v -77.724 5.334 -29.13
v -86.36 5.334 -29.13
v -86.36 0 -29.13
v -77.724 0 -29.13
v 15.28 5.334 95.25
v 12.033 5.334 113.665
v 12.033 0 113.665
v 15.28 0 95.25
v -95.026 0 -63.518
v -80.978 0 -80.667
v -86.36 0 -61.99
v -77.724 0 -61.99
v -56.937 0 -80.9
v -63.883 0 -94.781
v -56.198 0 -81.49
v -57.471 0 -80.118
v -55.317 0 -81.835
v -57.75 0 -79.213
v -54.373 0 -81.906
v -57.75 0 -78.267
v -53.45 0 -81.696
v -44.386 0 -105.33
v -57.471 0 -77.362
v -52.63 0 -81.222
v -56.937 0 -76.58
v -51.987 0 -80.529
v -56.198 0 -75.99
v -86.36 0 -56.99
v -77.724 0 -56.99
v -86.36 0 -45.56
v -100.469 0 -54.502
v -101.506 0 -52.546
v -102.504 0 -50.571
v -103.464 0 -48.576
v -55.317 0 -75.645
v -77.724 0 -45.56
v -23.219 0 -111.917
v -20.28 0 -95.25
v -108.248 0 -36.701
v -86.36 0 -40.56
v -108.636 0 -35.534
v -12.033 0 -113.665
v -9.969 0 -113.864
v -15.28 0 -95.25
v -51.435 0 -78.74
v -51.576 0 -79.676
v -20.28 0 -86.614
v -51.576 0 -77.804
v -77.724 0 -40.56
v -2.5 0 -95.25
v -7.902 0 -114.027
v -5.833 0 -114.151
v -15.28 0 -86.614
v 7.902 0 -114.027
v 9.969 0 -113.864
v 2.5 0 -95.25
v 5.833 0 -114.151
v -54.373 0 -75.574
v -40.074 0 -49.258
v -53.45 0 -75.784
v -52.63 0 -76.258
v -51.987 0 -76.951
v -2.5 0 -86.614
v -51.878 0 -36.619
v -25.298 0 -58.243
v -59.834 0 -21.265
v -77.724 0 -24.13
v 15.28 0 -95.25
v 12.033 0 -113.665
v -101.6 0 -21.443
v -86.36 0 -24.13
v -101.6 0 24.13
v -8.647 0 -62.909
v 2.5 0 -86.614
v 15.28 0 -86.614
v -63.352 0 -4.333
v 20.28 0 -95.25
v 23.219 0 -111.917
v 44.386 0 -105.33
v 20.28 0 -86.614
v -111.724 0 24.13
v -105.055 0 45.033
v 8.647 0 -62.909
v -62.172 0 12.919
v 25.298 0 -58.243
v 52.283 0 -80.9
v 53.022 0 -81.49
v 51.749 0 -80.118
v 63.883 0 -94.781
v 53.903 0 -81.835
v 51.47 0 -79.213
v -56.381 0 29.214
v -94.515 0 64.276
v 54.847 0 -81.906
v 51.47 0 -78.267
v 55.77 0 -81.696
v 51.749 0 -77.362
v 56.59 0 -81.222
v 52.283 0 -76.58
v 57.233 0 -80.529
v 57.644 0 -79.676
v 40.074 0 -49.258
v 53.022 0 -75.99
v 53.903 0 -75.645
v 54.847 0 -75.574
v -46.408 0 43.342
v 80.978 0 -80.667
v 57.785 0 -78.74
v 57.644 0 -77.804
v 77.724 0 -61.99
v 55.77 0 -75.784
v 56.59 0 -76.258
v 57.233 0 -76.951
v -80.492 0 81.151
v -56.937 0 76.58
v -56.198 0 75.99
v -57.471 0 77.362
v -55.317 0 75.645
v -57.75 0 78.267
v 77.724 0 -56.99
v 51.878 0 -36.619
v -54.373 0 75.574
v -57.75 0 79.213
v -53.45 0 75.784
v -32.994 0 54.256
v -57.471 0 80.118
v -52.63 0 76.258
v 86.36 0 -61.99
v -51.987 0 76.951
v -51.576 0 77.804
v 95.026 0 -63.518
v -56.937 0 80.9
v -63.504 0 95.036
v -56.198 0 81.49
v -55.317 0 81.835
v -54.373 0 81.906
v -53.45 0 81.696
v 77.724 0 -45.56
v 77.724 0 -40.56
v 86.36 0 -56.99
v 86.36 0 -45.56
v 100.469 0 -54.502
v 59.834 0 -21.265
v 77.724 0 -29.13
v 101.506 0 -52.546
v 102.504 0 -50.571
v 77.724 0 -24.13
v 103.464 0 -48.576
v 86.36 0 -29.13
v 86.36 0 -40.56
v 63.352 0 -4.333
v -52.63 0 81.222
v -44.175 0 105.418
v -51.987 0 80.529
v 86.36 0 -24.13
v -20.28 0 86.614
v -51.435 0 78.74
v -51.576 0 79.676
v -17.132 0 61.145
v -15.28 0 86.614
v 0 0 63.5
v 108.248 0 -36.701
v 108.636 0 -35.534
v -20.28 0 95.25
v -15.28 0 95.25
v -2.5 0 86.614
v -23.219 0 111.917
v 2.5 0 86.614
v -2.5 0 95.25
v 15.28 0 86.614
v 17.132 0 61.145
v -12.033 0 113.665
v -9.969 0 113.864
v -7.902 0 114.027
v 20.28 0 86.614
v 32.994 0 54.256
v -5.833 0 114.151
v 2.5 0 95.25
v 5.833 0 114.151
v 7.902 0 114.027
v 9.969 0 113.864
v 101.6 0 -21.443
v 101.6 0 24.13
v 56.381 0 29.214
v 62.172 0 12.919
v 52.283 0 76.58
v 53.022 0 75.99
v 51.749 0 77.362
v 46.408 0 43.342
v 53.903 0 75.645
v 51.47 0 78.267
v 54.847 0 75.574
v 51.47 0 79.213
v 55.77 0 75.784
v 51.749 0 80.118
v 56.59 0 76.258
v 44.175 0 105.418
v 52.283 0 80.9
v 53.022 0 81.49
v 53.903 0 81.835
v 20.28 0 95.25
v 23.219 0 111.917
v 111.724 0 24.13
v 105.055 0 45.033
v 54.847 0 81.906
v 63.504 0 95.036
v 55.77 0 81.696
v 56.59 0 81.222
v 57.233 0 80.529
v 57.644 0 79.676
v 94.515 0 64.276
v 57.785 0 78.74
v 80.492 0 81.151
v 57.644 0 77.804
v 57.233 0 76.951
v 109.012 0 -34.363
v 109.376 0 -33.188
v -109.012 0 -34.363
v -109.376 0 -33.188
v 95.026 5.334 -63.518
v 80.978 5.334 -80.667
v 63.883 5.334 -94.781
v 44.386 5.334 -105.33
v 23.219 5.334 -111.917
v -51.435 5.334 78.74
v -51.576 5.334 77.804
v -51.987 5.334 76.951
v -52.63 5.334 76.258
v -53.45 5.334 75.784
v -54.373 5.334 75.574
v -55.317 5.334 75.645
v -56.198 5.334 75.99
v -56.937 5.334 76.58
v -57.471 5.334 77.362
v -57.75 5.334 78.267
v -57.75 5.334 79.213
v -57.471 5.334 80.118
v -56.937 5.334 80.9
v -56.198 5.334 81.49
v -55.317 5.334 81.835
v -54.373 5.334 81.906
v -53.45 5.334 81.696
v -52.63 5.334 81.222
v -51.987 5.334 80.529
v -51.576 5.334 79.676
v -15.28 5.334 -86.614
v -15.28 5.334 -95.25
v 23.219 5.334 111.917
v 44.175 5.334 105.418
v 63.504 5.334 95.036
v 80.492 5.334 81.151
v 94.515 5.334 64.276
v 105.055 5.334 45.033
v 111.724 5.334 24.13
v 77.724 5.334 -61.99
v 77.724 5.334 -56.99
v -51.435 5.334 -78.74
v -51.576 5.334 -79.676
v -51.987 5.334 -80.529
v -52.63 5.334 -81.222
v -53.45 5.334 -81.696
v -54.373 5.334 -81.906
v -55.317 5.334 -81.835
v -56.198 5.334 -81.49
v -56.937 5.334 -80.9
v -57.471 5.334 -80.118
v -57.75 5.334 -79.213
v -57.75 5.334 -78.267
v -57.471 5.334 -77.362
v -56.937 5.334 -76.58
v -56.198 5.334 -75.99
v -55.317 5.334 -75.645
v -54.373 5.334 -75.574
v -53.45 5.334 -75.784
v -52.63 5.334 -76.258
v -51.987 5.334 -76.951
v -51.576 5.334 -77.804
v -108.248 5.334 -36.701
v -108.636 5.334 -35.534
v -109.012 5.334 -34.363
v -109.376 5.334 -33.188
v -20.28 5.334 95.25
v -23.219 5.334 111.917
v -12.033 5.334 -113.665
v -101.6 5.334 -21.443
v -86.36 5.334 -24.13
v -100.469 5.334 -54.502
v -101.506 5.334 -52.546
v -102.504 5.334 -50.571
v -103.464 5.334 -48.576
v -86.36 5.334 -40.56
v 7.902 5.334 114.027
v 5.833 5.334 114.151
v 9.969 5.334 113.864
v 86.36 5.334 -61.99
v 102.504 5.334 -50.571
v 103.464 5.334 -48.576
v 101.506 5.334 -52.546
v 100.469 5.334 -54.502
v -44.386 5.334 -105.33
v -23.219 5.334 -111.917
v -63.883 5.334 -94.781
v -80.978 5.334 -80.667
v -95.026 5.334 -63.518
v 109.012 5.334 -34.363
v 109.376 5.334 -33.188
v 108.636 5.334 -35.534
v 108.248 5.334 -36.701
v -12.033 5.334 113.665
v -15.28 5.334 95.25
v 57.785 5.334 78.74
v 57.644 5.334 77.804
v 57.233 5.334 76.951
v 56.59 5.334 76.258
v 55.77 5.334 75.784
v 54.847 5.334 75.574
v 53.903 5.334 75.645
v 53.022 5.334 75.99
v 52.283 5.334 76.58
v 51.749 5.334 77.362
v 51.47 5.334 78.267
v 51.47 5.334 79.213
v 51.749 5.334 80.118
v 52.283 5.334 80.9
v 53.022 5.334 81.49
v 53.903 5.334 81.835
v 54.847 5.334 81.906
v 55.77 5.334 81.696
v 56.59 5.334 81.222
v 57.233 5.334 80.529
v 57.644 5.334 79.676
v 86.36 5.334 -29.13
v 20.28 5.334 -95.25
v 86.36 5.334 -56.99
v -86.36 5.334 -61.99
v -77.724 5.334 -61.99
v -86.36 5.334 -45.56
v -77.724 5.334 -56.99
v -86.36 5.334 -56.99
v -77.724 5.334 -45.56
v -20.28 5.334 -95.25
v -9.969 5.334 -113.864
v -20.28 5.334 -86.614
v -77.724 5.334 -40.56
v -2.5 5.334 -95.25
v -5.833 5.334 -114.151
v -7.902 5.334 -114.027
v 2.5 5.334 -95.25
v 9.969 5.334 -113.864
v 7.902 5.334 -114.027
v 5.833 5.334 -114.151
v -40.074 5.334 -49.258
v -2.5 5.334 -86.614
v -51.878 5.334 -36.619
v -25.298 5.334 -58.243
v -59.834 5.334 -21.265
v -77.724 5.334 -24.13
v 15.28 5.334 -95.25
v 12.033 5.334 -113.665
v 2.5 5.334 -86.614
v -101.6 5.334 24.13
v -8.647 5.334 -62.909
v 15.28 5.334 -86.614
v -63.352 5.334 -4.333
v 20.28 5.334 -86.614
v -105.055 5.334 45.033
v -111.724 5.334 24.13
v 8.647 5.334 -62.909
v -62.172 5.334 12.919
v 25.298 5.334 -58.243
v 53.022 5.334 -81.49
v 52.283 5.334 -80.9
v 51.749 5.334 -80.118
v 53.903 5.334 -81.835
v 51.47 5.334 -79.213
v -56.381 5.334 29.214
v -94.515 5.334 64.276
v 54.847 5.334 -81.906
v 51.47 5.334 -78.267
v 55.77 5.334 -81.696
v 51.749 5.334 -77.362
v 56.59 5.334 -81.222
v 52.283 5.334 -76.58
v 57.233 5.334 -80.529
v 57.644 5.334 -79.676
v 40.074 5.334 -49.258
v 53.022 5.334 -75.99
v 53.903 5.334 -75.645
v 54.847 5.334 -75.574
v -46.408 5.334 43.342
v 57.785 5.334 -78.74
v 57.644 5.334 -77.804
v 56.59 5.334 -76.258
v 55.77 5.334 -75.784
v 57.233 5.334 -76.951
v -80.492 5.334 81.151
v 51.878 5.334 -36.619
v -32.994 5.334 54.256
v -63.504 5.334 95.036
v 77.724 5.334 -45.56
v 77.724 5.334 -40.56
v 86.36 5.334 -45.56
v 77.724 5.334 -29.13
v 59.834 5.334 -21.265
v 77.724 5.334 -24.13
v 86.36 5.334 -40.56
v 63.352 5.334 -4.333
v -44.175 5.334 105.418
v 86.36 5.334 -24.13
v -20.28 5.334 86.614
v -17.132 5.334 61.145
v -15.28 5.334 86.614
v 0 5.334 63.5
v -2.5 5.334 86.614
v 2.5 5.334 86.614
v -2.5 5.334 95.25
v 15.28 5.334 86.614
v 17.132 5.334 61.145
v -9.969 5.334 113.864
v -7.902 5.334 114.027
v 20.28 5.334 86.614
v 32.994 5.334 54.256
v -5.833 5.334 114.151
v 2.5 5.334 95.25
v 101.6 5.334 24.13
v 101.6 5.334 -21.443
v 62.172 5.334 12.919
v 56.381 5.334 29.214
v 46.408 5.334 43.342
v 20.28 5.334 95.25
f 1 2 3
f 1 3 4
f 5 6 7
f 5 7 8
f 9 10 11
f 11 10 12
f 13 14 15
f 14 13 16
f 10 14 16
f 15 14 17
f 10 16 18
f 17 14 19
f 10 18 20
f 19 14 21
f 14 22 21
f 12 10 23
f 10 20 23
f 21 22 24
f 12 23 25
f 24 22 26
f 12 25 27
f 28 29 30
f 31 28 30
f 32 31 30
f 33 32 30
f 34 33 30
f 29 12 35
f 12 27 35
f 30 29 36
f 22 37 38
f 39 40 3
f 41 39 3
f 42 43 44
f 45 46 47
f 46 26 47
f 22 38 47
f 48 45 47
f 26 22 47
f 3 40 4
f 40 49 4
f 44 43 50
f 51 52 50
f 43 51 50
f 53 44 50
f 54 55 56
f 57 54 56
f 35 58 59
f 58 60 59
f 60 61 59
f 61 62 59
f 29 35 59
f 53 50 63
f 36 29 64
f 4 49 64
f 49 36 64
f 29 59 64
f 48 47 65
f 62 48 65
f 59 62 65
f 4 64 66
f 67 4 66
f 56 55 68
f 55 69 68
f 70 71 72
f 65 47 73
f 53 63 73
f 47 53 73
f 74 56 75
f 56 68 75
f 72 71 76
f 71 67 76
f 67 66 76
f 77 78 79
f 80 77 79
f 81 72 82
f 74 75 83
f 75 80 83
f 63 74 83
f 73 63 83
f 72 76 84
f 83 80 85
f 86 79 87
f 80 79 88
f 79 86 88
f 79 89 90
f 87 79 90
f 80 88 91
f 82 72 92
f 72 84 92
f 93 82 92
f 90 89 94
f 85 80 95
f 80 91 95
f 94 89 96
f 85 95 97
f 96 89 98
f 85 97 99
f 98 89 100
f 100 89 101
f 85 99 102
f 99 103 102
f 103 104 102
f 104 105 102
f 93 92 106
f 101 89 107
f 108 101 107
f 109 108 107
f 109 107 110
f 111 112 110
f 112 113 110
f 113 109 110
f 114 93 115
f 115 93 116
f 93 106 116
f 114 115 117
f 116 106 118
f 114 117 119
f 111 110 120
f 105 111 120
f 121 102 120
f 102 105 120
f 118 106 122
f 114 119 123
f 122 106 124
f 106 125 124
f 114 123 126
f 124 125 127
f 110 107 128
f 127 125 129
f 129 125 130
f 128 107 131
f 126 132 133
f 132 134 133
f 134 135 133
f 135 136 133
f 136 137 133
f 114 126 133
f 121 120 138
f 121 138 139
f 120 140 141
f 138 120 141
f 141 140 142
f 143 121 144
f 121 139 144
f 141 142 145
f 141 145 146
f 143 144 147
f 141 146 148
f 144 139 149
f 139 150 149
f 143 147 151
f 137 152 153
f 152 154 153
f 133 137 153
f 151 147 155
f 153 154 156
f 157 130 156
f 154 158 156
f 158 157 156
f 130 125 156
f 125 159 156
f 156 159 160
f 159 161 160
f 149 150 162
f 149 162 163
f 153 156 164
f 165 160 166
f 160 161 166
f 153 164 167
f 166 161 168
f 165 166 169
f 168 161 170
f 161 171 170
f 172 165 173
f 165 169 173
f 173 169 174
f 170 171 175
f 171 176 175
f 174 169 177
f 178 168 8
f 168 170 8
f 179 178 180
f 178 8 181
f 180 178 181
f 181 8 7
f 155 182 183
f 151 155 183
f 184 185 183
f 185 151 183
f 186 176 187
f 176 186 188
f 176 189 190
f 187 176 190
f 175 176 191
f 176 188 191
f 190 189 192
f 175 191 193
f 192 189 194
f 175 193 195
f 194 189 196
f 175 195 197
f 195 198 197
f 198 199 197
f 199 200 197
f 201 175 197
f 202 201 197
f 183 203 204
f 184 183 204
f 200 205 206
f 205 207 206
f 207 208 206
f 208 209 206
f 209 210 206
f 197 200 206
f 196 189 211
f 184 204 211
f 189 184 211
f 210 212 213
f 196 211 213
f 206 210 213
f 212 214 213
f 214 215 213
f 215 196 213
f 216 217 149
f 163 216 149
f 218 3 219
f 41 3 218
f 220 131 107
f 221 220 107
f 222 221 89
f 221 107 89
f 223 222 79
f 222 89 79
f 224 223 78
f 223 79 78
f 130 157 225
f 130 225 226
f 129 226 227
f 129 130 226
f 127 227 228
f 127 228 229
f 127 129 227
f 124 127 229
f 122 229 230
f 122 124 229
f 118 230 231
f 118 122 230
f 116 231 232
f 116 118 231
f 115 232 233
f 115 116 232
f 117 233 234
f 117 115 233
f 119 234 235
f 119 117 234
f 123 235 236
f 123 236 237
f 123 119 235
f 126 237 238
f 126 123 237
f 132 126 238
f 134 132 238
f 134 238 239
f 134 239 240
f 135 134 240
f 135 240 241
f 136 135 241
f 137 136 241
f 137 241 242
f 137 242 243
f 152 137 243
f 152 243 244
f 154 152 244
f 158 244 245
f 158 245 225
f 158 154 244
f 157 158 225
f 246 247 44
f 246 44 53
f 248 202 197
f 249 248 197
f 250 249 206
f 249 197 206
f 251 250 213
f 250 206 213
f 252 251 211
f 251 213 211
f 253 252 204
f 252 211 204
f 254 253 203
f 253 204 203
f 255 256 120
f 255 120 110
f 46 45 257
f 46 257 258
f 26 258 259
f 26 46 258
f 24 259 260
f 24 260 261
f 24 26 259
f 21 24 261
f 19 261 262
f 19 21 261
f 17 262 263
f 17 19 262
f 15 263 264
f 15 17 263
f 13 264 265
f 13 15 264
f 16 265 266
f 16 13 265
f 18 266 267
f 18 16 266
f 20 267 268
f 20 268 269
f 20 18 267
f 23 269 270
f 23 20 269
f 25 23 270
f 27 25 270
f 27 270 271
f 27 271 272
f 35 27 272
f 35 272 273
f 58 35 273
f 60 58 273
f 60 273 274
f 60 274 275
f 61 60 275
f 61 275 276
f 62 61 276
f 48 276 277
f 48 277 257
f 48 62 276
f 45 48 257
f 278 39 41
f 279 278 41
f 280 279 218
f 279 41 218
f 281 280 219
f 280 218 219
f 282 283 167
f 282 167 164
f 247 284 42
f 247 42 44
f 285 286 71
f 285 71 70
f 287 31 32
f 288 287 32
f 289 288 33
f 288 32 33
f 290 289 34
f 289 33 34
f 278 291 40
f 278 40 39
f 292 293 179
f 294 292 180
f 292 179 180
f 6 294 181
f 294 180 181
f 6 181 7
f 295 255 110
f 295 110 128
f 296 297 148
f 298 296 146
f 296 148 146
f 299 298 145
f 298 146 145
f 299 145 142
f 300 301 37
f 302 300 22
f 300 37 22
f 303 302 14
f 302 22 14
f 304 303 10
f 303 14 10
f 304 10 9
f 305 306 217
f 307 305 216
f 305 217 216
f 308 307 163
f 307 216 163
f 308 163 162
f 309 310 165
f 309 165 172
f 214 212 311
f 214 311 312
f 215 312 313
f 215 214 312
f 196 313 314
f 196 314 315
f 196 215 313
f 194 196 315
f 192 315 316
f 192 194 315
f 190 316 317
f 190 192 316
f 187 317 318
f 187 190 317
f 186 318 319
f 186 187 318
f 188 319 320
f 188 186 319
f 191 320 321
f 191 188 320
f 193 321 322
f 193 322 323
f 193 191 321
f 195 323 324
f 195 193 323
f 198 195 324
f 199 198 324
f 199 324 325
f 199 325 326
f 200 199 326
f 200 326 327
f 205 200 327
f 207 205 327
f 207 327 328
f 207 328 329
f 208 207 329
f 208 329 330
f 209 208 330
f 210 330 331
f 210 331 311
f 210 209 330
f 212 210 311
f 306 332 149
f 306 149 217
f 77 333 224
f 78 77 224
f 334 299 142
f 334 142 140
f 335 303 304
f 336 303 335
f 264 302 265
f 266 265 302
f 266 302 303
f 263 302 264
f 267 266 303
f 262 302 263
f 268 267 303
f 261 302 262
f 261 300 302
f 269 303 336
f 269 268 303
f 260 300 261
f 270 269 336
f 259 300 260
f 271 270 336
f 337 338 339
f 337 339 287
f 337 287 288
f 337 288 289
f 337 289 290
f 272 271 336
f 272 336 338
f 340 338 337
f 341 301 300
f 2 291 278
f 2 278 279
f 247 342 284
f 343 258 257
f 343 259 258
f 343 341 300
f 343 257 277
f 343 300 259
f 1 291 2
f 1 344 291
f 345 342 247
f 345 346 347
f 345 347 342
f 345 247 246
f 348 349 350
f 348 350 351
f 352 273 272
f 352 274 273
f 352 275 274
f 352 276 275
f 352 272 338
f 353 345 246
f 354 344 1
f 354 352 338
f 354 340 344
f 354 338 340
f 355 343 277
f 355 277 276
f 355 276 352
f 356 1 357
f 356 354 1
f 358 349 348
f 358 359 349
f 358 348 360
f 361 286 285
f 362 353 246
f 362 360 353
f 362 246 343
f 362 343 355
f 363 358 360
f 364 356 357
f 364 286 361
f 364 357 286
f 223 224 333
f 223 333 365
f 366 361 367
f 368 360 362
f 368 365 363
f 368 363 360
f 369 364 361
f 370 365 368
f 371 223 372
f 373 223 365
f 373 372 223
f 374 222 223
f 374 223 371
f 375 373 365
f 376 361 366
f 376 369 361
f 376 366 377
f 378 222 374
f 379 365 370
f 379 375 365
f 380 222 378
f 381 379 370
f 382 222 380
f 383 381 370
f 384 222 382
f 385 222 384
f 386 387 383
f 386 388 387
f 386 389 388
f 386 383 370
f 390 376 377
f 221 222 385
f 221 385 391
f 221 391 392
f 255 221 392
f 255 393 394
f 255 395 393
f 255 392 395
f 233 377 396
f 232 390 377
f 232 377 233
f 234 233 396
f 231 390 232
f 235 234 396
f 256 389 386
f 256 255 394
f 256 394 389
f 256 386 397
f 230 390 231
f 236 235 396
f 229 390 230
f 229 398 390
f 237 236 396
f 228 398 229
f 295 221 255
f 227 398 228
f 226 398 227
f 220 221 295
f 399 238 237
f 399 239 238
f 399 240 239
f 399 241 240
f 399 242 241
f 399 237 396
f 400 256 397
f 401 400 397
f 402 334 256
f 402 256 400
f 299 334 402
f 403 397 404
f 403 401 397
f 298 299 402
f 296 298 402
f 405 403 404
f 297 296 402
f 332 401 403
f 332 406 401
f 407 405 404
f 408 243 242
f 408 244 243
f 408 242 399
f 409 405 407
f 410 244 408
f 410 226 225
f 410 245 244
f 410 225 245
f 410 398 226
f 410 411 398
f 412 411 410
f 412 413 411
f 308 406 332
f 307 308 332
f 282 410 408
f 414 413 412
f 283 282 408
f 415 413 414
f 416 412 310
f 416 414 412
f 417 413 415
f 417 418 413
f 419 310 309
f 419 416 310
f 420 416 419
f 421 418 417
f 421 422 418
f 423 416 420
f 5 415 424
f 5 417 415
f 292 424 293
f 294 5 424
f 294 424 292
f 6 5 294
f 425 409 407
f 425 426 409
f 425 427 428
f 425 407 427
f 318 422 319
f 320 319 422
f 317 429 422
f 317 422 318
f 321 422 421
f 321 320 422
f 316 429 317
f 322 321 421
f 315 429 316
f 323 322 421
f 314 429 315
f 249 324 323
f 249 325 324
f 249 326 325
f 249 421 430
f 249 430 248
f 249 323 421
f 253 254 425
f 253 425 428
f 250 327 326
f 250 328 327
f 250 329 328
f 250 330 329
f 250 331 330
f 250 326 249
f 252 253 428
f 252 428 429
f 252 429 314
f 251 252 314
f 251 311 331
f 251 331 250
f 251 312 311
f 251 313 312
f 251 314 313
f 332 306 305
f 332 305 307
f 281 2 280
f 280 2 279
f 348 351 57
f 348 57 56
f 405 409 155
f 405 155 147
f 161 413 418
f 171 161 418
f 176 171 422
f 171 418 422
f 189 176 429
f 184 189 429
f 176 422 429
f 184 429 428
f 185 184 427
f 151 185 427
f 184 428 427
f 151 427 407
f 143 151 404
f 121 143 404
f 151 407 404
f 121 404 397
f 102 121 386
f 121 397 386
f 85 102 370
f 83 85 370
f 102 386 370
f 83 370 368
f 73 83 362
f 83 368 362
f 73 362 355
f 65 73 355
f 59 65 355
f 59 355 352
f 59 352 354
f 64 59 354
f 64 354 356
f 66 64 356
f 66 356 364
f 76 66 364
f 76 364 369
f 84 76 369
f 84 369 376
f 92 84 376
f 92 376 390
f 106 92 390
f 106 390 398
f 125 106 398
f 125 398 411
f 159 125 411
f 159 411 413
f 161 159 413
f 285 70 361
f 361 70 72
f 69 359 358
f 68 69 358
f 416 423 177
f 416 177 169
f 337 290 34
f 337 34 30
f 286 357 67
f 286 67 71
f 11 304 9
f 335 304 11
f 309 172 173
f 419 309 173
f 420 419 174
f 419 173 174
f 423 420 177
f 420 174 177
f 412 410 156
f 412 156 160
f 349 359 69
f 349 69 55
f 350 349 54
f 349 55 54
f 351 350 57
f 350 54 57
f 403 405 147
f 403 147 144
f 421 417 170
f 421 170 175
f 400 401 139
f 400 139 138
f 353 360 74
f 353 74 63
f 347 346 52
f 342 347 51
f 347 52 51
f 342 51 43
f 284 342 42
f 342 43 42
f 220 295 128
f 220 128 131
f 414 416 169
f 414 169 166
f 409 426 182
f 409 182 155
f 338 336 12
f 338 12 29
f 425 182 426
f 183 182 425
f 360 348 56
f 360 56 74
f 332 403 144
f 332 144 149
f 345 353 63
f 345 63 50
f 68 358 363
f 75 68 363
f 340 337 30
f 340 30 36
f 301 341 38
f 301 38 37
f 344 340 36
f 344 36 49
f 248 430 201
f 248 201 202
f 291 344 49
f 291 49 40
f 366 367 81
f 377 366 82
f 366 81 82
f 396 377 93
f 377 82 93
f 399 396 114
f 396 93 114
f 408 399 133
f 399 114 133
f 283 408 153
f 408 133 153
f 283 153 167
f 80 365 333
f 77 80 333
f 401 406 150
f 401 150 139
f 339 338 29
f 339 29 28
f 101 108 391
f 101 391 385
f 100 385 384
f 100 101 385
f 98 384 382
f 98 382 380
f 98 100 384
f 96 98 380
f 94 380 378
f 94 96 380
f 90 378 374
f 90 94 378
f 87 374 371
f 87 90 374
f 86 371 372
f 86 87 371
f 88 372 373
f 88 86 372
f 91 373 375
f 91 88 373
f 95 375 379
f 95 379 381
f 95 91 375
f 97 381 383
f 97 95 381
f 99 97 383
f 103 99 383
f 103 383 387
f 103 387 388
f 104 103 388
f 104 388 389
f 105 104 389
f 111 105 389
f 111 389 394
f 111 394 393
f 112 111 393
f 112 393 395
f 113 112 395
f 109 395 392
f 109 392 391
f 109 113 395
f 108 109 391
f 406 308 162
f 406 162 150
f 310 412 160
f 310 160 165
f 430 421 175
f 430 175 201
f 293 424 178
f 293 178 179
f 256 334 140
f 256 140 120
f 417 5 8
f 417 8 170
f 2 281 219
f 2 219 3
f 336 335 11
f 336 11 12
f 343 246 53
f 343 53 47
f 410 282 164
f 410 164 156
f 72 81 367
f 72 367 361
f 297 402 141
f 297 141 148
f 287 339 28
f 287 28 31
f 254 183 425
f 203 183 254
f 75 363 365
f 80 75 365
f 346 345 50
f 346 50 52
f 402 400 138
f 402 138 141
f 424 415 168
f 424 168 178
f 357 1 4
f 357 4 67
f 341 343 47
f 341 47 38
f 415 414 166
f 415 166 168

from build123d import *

# Parameters (mm, degrees)
SKETCH1_R            = 114.3
BASE_DEPTH           = 5.334
SKETCH2_R            = 63.5
CENTER_CUT_DEPTH     = 162.732592745
SENSOR_CUTOUTS_DEPTH = 162.732592745
SKETCH7_W            = 30.48
SKETCH7_H            = 48.26
CUT_EXTRUDE2_DEPTH   = 162.891213524
HOLE3_OUTLINE_R      = 3.175
HOLE3_DEPTH          = 5.334


# Read off the part's stored shape, not the designer's step: Hole3
with BuildPart() as part:
    # Sketch1 → Base (new body)
    with BuildSketch(Plane(origin=(0, 0, 0), x_dir=(1, 0, 0), z_dir=(0, 1, 0))):
        with Locations(Location((0, 0, 0), (0, 0, 270))):
            Circle(SKETCH1_R)
    extrude(amount=BASE_DEPTH)

    # Sketch2 → Center Cut (cut, through all)
    with BuildSketch(Plane(origin=(0, 5.334, 0), x_dir=(1, 0, 0), z_dir=(0, 1, 0))):
        with Locations(Location((0, 0, 0), (0, 0, 270))):
            Circle(SKETCH2_R)
    extrude(amount=-CENTER_CUT_DEPTH, mode=Mode.SUBTRACT)

    # Sketch3 → Sensor Cutouts (cut, through all)
    with BuildSketch(Plane(origin=(0, 5.334, 0), x_dir=(1, 0, 0), z_dir=(0, 1, 0))):
        with BuildLine():
            Line((5.832770158, 114.151078805), (2.5, 95.25))
            Line((2.5, 95.25), (2.5, 86.614))
            Line((2.5, 86.614), (-2.5, 86.614))
            Line((-2.5, 86.614), (-2.5, 95.25))
            Line((-2.5, 95.25), (-5.832770158, 114.151078805))
            ThreePointArc((-5.832770158, 114.151078805), (0, 114.3), (5.832770158, 114.151078805))
        make_face()
        with BuildLine():
            Line((20.28, 95.25), (23.218811767, 111.916829745))
            ThreePointArc((23.218811767, 111.916829745), (17.647544886, 112.929421142), (12.032965395, 113.664848321))
            Line((12.032965395, 113.664848321), (15.28, 95.25))
            Line((15.28, 95.25), (15.28, 86.614))
            Line((15.28, 86.614), (20.28, 86.614))
            Line((20.28, 86.614), (20.28, 95.25))
        make_face()
        with BuildLine():
            Line((-20.28, 95.25), (-23.218811767, 111.916829745))
            ThreePointArc((-23.218811767, 111.916829745), (-17.647544886, 112.929421142), (-12.032965395, 113.664848321))
            Line((-12.032965395, 113.664848321), (-15.28, 95.25))
            Line((-15.28, 95.25), (-15.28, 86.614))
            Line((-15.28, 86.614), (-20.28, 86.614))
            Line((-20.28, 86.614), (-20.28, 95.25))
        make_face()
        Polygon((86.36, 45.56), (114.3, 50.486575841), (114.3, 35.633424159), (86.36, 40.56), (77.724, 40.56), (77.724, 45.56), align=None)
        Polygon((86.36, 61.99), (114.3, 66.916575841), (114.3, 52.063424159), (86.36, 56.99), (77.724, 56.99), (77.724, 61.99), align=None)
        Polygon((86.36, 29.13), (114.3, 34.056575841), (114.3, 19.203424159), (86.36, 24.13), (77.724, 24.13), (77.724, 29.13), align=None)
        with BuildLine():
            Line((15.28, -95.25), (15.28, -86.614))
            Line((15.28, -86.614), (20.28, -86.614))
            Line((20.28, -86.614), (20.28, -95.25))
            Line((20.28, -95.25), (23.218811767, -111.916829745))
            ThreePointArc((23.218811767, -111.916829745), (17.647544886, -112.929421142), (12.032965395, -113.664848321))
            Line((12.032965395, -113.664848321), (15.28, -95.25))
        make_face()
        with BuildLine():
            Line((2.5, -86.614), (2.5, -95.25))
            Line((2.5, -95.25), (5.832770158, -114.151078805))
            ThreePointArc((5.832770158, -114.151078805), (0, -114.3), (-5.832770158, -114.151078805))
            Line((-5.832770158, -114.151078805), (-2.5, -95.25))
            Line((-2.5, -95.25), (-2.5, -86.614))
            Line((-2.5, -86.614), (2.5, -86.614))
        make_face()
        with BuildLine():
            Line((-15.28, -86.614), (-15.28, -95.25))
            Line((-15.28, -95.25), (-12.032965395, -113.664848321))
            ThreePointArc((-12.032965395, -113.664848321), (-17.647544886, -112.929421142), (-23.218811767, -111.916829745))
            Line((-23.218811767, -111.916829745), (-20.28, -95.25))
            Line((-20.28, -95.25), (-20.28, -86.614))
            Line((-20.28, -86.614), (-15.28, -86.614))
        make_face()
        Polygon((-77.724, 24.13), (-86.36, 24.13), (-114.3, 19.203424159), (-114.3, 34.056575841), (-86.36, 29.13), (-77.724, 29.13), align=None)
        Polygon((-77.724, 40.56), (-86.36, 40.56), (-114.3, 35.633424159), (-114.3, 50.486575841), (-86.36, 45.56), (-77.724, 45.56), align=None)
        Polygon((-77.724, 56.99), (-86.36, 56.99), (-114.3, 52.063424159), (-114.3, 66.916575841), (-86.36, 61.99), (-77.724, 61.99), align=None)
    extrude(amount=-SENSOR_CUTOUTS_DEPTH, mode=Mode.SUBTRACT)

    # Sketch7 → Cut-Extrude2 (cut, through all)
    with BuildSketch(Plane.XZ.offset(5.334)):
        with Locations((-116.84, 0)):
            Rectangle(SKETCH7_W, SKETCH7_H)
        with Locations((116.84, 0)):
            Rectangle(SKETCH7_W, SKETCH7_H)
    extrude(amount=-CUT_EXTRUDE2_DEPTH, mode=Mode.SUBTRACT)

    # Hole3 outline → Hole3 (cut)
    with BuildSketch(Plane(origin=(0, 0, 0), x_dir=(1, 0, 0), z_dir=(0, 1, 0))):
        with Locations((-54.61, -78.74)):
            Circle(HOLE3_OUTLINE_R)
        with Locations((54.61, -78.74)):
            Circle(HOLE3_OUTLINE_R)
        with Locations((54.61, 78.74)):
            Circle(HOLE3_OUTLINE_R)
        with Locations((-54.61, 78.74)):
            Circle(HOLE3_OUTLINE_R)
    extrude(amount=HOLE3_DEPTH, mode=Mode.SUBTRACT)


solid = part.part
